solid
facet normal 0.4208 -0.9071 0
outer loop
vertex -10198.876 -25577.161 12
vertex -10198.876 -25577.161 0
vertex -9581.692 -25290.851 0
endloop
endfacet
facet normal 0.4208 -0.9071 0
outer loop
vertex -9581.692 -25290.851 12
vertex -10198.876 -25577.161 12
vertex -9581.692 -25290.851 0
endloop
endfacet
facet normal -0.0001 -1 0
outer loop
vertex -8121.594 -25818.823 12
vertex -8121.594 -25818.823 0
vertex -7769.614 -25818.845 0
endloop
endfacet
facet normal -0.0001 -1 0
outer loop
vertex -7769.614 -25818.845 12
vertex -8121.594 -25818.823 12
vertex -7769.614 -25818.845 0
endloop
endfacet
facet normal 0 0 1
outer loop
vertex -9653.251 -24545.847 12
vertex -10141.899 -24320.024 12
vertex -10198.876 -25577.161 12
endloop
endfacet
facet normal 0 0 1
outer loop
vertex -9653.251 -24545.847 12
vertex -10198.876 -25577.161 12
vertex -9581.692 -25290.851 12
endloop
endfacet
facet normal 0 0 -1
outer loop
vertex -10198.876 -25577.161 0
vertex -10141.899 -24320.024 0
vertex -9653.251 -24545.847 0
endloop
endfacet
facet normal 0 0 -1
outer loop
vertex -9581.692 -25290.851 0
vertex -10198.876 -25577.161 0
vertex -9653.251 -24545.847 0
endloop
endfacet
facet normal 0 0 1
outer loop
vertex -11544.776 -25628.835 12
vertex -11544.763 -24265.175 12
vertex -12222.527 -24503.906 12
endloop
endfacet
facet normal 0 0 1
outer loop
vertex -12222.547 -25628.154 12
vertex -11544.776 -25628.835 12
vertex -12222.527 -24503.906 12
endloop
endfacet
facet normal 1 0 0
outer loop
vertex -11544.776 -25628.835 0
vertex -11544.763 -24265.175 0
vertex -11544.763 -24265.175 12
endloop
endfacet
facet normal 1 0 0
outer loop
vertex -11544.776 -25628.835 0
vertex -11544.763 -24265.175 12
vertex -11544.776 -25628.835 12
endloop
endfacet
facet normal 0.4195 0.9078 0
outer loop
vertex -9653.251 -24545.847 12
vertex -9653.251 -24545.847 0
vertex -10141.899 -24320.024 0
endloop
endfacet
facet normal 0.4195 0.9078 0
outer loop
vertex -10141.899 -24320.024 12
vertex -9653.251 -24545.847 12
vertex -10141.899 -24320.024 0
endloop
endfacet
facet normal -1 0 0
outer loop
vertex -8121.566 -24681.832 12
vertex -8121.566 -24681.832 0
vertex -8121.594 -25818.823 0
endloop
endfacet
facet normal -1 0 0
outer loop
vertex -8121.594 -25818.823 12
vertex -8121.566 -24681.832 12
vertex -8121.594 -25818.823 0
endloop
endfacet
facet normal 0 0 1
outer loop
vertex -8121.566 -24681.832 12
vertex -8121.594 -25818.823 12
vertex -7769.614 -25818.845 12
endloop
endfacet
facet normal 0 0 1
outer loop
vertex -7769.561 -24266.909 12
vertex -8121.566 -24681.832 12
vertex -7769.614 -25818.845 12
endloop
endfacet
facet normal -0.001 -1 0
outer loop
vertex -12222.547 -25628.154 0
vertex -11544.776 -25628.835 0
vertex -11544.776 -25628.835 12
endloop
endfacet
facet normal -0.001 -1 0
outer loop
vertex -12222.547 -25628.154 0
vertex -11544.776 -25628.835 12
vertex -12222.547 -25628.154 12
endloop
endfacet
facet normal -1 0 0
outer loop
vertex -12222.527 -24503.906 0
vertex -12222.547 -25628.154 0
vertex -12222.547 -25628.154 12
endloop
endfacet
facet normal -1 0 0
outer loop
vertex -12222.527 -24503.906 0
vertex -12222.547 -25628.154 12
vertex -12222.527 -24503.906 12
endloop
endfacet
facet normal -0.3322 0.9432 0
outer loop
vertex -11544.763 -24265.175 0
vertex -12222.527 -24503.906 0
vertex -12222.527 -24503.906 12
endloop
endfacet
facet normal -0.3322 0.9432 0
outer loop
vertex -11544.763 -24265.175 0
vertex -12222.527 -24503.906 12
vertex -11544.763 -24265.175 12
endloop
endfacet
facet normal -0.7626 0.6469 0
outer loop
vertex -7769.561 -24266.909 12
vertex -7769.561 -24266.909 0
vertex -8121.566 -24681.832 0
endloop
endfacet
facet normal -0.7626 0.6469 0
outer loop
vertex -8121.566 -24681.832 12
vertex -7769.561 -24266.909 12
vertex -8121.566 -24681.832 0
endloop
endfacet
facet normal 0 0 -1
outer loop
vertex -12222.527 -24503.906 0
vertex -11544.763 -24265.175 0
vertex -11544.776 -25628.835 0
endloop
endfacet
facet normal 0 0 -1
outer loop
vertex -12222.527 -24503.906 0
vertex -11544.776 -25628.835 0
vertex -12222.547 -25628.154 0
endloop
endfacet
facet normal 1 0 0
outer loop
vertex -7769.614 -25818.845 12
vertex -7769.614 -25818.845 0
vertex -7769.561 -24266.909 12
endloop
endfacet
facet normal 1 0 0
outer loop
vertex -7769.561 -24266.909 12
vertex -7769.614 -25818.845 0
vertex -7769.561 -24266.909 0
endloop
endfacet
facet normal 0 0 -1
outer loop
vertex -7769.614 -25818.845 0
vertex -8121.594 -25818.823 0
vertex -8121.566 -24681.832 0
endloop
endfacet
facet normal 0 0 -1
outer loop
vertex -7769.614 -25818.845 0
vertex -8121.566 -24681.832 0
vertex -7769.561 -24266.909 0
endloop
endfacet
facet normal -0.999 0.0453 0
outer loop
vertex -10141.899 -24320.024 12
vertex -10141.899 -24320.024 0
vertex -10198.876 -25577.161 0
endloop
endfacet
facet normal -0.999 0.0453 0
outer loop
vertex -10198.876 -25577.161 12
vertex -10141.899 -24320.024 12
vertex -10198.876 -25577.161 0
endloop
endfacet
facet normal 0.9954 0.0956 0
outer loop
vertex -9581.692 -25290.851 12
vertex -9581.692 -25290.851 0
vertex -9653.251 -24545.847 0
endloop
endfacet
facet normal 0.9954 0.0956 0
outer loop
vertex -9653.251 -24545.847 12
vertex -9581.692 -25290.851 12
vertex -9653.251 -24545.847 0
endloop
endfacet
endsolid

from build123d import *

# Parameters (mm, degrees)
Y_KSEKLIK_EKSTR_ZYON1_DEPTH   = 12
Y_KSEKLIK_EKSTR_ZYON1_2_DEPTH = 12
Y_KSEKLIK_EKSTR_ZYON1_3_DEPTH = 12


with BuildPart() as part:
    # Çizim1 → Yükseklik-Ekstrüzyon1 (new body)
    with BuildSketch(Plane.XY):
        Polygon((-11544.763432538, -24265.175463113), (-11544.775691722, -25628.835401716), (-12222.546966622, -25628.154435718), (-12222.526758536, -24503.905779923), align=None)
    extrude(amount=Y_KSEKLIK_EKSTR_ZYON1_DEPTH)


with BuildPart() as body_2:
    # Çizim1 → Y_kseklik-Ekstr_zyon1 2 (new body)
    with BuildSketch(Plane.XY):
        Polygon((-8121.566339207, -24681.832172443), (-8121.59447703, -25818.823497743), (-7769.613636026, -25818.845017714), (-7769.560705178, -24266.909097047), align=None)
    extrude(amount=Y_KSEKLIK_EKSTR_ZYON1_2_DEPTH)


with BuildPart() as body_3:
    # Çizim1 → Y_kseklik-Ekstr_zyon1 3 (new body)
    with BuildSketch(Plane.XY):
        Polygon((-10141.898890802, -24320.024195408), (-10198.876287928, -25577.160508614), (-9581.692257619, -25290.850614754), (-9653.250878476, -24545.847392263), align=None)
    extrude(amount=Y_KSEKLIK_EKSTR_ZYON1_3_DEPTH)


solid = Compound([part.part, body_2.part, body_3.part])
